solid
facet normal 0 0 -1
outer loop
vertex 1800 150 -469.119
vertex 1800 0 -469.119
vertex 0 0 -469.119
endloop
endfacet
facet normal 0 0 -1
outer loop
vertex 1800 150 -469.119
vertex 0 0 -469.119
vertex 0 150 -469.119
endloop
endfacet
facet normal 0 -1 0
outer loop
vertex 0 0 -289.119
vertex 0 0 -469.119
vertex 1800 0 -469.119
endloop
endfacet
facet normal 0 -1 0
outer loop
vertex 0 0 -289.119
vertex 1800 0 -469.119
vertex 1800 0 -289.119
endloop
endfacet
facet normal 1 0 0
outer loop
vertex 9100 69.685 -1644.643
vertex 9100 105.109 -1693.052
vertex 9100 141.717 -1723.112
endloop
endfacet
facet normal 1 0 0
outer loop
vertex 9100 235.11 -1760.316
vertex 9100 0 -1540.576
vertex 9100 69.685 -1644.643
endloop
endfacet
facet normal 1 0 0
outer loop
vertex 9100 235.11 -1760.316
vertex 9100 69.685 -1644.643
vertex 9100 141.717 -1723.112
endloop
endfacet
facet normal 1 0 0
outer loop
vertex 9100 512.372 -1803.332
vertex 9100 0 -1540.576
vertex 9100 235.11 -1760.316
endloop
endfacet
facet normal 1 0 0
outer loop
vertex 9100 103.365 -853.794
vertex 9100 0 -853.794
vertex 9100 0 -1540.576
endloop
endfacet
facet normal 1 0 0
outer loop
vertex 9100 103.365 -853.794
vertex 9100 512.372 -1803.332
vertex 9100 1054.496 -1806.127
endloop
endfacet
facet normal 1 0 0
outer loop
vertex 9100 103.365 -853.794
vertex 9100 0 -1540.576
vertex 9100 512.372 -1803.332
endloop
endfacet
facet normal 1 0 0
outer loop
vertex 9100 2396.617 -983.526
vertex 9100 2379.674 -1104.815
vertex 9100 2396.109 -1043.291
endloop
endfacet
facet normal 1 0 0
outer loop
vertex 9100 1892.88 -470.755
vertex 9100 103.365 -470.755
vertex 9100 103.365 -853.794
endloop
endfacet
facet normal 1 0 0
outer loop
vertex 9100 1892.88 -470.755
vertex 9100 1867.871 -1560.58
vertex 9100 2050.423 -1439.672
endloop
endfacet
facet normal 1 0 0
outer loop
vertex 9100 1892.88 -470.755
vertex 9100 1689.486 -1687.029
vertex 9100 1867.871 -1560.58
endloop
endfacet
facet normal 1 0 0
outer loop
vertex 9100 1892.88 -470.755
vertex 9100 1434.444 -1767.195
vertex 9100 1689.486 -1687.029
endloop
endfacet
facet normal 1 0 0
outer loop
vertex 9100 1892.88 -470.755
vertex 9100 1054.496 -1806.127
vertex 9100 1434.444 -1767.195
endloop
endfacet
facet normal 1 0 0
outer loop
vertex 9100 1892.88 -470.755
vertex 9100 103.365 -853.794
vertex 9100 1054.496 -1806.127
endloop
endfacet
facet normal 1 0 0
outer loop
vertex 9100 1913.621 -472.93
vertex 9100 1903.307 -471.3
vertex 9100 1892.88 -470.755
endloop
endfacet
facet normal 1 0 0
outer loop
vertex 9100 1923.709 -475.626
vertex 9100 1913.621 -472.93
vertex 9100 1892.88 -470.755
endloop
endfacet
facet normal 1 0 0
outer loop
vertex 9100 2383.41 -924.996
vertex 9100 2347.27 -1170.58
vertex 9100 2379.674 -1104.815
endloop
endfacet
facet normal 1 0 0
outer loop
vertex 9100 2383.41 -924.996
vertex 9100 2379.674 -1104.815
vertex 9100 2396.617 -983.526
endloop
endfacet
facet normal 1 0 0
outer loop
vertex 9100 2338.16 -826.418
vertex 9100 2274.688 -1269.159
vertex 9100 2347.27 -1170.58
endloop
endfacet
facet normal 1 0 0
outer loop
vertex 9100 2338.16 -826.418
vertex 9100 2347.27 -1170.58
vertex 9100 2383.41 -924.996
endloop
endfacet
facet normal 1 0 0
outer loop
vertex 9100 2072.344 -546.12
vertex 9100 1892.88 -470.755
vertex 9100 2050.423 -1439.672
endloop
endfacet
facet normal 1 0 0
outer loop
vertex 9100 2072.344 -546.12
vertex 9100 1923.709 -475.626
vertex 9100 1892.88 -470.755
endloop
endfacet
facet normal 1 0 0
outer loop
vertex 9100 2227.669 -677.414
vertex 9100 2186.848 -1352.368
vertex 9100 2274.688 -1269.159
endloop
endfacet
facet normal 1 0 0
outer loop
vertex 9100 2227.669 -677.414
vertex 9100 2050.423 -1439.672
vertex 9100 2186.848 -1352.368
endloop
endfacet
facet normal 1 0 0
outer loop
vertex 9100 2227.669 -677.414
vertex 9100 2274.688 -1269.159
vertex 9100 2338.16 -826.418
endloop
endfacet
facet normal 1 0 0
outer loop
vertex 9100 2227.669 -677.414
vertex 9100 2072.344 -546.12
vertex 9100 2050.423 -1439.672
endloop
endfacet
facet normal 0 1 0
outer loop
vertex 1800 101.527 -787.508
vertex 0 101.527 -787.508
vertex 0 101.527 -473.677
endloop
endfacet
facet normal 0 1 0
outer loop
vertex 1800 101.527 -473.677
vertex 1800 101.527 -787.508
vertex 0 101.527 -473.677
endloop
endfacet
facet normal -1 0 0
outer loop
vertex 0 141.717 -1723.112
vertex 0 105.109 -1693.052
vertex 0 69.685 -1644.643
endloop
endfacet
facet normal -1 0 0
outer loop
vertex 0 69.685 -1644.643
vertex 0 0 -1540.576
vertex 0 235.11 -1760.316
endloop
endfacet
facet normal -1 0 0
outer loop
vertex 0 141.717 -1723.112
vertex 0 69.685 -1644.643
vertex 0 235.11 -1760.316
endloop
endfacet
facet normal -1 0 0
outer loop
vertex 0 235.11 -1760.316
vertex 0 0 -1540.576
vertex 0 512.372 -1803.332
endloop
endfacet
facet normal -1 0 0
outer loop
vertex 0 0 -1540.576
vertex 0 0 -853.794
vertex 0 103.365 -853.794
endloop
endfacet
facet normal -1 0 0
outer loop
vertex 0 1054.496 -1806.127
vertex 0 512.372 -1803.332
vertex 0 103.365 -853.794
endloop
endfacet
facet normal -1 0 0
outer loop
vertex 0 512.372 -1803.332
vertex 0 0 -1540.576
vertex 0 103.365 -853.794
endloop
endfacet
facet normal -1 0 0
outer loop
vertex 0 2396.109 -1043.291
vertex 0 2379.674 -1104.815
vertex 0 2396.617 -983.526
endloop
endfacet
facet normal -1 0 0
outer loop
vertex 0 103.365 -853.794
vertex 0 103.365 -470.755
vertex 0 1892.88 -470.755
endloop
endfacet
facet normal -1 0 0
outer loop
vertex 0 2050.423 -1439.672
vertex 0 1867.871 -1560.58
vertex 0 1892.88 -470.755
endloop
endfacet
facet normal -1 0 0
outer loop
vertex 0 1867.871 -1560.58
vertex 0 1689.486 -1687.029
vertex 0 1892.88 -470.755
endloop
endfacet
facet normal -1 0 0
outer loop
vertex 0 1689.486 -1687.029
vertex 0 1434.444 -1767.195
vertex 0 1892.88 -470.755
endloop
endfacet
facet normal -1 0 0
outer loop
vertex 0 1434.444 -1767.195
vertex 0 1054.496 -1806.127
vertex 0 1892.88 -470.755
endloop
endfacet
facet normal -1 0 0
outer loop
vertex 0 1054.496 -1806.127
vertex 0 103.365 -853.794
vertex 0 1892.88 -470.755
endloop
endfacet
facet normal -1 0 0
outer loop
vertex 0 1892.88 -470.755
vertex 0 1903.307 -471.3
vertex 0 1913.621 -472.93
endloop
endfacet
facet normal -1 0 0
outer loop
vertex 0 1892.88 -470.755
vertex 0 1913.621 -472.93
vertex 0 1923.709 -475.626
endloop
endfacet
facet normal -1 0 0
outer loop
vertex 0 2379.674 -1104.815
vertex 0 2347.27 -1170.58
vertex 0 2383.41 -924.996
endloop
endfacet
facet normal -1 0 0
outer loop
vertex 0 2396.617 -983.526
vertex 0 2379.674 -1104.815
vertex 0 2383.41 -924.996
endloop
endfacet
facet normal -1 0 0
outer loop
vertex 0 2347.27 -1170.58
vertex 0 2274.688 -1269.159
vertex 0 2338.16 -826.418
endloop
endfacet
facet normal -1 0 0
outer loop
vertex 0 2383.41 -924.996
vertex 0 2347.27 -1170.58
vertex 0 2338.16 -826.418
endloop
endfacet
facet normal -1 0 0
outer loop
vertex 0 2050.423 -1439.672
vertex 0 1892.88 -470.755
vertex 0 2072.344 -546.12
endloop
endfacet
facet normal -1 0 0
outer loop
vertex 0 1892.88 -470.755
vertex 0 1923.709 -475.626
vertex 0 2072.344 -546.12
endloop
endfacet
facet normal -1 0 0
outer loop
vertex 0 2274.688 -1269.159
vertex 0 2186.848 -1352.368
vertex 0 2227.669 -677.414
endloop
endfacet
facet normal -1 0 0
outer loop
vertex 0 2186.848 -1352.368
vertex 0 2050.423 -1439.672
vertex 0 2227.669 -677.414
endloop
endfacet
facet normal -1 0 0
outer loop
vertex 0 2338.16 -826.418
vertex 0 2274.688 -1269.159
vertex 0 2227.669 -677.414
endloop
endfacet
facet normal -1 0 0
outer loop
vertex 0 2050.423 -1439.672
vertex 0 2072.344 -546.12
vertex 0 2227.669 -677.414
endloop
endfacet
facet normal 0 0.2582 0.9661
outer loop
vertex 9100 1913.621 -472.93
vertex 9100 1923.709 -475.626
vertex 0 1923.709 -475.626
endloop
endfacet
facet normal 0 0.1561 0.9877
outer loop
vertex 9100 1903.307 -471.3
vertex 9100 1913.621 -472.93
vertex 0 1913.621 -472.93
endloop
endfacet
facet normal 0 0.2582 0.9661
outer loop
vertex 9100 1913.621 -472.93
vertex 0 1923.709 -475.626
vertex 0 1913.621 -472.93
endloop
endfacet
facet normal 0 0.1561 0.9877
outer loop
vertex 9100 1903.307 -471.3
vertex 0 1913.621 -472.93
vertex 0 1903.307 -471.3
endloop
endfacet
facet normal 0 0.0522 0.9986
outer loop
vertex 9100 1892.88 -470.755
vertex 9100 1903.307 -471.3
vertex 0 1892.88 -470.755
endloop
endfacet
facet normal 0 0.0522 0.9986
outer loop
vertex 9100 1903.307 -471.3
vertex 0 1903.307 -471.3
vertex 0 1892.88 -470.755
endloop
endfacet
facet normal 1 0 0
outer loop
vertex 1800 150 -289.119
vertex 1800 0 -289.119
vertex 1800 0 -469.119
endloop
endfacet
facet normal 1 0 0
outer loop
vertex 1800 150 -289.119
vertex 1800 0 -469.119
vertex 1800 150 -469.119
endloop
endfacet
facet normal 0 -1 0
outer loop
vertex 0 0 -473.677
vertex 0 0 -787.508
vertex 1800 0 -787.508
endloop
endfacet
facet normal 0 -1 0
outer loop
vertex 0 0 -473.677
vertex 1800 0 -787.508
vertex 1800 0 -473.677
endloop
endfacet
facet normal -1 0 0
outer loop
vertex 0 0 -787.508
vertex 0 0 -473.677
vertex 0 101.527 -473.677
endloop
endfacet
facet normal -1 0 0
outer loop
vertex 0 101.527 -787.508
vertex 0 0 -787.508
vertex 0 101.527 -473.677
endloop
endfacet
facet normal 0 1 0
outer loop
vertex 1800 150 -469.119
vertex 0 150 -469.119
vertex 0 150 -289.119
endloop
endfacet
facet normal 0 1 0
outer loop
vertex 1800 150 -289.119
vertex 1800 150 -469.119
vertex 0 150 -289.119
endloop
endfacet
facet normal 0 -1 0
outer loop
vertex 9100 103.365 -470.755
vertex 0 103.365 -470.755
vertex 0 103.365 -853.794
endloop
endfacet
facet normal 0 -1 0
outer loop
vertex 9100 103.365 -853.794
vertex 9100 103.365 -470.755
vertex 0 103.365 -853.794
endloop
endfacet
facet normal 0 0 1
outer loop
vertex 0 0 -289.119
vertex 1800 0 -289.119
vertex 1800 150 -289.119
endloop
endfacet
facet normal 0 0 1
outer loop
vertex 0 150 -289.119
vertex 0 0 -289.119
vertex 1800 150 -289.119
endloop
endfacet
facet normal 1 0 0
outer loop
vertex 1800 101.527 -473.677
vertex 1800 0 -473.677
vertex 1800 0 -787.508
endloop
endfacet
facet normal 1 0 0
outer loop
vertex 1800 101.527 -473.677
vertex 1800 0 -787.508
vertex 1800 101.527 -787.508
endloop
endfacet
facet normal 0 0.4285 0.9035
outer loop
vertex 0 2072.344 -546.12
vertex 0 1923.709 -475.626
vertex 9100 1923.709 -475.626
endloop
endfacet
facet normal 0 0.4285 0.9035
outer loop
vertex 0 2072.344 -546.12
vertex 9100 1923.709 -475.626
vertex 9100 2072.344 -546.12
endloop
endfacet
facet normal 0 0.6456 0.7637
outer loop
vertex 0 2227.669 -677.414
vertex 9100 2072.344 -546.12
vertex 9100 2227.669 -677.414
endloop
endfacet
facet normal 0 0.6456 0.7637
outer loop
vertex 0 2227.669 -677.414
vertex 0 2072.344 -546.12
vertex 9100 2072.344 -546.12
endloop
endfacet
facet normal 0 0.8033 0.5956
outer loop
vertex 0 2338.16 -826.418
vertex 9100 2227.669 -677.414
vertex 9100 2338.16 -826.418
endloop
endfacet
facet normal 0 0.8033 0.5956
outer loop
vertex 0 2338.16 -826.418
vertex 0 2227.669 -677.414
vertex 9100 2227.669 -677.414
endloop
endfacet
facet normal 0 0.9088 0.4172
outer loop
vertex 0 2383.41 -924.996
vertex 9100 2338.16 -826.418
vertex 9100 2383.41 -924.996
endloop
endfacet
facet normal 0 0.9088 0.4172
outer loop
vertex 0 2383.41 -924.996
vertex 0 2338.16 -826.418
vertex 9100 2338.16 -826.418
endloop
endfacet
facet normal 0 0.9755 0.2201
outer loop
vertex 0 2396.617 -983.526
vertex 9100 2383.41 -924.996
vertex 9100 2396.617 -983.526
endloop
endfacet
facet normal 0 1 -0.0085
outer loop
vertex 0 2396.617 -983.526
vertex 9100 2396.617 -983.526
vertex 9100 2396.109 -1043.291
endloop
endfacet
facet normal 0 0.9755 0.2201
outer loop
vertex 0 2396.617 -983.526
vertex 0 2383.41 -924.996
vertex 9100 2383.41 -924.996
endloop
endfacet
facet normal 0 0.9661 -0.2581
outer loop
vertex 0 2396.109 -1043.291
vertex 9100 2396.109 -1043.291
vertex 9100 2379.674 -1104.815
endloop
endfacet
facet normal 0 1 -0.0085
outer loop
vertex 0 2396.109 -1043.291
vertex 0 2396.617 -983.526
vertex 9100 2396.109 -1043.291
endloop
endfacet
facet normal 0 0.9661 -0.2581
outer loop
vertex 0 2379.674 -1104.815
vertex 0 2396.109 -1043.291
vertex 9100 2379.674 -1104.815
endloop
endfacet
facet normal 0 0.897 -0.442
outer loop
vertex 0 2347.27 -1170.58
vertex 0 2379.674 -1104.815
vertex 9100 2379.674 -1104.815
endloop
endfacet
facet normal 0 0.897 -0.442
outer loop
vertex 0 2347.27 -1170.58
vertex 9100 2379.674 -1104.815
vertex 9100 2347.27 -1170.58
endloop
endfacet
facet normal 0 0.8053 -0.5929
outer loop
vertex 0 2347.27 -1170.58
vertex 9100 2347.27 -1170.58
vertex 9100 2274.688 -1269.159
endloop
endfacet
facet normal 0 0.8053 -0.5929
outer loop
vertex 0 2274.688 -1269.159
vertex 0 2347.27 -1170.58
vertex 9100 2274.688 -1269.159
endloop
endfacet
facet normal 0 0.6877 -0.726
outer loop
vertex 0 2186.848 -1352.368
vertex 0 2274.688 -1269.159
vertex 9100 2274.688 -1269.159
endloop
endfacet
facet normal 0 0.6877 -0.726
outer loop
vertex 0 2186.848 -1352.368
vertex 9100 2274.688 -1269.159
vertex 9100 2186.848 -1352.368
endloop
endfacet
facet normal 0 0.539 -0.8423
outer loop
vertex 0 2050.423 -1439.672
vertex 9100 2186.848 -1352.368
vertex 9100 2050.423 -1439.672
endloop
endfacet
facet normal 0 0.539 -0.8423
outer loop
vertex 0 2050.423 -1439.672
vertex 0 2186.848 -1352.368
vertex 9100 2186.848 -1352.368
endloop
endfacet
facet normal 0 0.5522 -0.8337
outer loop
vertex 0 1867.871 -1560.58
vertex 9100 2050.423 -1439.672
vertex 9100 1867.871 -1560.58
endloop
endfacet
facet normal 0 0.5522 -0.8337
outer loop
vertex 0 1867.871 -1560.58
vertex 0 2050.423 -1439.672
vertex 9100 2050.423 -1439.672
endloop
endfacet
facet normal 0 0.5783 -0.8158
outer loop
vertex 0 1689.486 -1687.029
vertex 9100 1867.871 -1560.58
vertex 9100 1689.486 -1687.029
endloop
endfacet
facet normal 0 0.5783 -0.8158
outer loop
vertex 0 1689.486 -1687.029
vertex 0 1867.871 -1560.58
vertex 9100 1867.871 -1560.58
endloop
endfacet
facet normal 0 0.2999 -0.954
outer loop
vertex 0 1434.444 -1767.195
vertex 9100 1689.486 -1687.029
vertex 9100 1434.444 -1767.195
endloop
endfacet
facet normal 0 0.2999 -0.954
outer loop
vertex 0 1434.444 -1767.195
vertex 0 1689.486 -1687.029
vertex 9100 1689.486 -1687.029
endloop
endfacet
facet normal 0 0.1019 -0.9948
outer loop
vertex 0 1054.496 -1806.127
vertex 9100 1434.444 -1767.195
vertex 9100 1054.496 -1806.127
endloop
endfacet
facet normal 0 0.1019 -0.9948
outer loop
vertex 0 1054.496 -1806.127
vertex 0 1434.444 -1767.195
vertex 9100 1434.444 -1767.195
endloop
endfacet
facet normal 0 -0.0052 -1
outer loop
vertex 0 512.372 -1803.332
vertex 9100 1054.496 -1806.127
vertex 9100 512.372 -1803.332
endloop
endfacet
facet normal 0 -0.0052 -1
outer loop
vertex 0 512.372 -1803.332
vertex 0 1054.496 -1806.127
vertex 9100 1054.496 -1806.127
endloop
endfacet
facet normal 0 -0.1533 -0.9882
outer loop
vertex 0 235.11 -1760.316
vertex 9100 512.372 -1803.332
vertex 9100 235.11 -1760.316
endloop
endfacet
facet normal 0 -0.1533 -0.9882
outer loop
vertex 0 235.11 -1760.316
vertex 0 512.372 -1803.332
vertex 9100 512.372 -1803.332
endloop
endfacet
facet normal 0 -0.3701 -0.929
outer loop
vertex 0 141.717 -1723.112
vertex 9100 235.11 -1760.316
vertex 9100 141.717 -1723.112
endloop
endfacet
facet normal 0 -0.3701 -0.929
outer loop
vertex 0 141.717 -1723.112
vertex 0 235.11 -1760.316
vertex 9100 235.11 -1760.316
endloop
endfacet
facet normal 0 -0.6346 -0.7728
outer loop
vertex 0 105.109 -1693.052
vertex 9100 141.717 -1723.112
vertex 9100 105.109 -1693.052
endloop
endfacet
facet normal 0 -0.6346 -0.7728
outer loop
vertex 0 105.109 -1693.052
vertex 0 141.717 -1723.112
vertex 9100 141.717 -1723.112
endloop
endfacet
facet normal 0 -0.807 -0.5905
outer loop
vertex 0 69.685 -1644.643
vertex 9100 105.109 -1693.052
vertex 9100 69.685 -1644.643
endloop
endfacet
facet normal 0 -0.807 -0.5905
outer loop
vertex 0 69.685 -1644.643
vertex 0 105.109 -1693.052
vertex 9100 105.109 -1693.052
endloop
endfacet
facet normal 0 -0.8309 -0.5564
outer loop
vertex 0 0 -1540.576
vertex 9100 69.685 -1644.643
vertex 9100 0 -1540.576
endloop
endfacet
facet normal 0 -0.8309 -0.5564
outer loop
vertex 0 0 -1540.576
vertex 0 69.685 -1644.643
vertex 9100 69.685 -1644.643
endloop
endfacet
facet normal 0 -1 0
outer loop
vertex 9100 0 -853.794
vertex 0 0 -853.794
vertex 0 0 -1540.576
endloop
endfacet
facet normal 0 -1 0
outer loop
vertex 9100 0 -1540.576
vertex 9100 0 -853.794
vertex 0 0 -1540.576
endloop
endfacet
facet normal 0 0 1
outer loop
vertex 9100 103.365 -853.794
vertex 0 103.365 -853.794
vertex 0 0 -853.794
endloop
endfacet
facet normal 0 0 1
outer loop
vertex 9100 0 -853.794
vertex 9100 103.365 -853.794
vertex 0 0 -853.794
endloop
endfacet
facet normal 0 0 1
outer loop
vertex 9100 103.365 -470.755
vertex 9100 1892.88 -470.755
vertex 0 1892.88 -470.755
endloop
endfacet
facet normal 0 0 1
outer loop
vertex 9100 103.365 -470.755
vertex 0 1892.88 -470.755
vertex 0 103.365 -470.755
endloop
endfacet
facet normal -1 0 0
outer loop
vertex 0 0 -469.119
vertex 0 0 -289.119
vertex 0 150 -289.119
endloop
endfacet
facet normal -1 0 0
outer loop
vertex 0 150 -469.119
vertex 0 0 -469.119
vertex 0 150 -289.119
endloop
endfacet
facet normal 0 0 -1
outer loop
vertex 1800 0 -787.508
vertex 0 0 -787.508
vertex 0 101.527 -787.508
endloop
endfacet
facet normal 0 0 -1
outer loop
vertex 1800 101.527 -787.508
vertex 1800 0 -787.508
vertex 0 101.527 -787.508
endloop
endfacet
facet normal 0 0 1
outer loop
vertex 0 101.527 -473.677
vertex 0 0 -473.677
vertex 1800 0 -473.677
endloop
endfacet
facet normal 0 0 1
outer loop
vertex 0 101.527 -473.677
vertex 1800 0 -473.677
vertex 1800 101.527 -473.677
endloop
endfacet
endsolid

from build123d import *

# Parameters (mm, degrees)
F0_W     = 150
F0_H     = 180
F2_DEPTH = 1800
F1_W     = 101.5273034573
F1_H     = 313.8310611248
F3_DEPTH = 1800
F5_DEPTH = 9100


with BuildPart() as f2:
    # F0 (on Right) → F2 (new body)
    with BuildSketch(Plane.YZ):
        with Locations((75, -379.1194679699)):
            Rectangle(F0_W, F0_H)
    extrude(amount=F2_DEPTH)


with BuildPart() as f3:
    # F1 (on Right) → F3 (new body)
    with BuildSketch(Plane.YZ):
        with Locations((50.7636517286, -630.5923610926)):
            Rectangle(F1_W, F1_H)
    extrude(amount=F3_DEPTH)


with BuildPart() as f5:
    # F4 (on Right) → F5 (new body)
    with BuildSketch(Plane.YZ):
        with BuildLine():
            Line((1892.8797360895, -470.7551300526), (103.3653095365, -470.7551300526))
            Line((103.3653095365, -470.7551300526), (103.3653095365, -853.7938594818))
            Line((103.3653095365, -853.7938594818), (0, -853.7938594818))
            Line((0, -853.7938594818), (0, -1540.5761003494))
            add(Edge.make_bspline(
                [(1923.7091770953, -475.6260305758), (2021.9512276147, -507.4643168356), (2114.6007561157, -574.5791921256), (2249.4279442365, -688.1869419876), (2373.689926805, -869.3452291568), (2422.473149728, -1054.9374831824), (2294.9004643375, -1264.5787956653), (2129.584685818, -1405.8258208718), (1905.6214540672, -1507.908233405), (1729.6425266662, -1710.9073670417), (1220.5242073932, -1821.0436072173), (783.690356481, -1798.497289961), (533.4726392689, -1811.6214951257), (290.8362151937, -1780.3357721623), (124.6406409215, -1728.1579217684), (71.3329574678, -1646.7422520232), (24.26819364, -1576.7017946172), (0, -1540.5761003494)],
                knots=[0.0033219062, 0.0033219062, 0.0033219062, 0.0033219062, 0.0680592667, 0.1252175941, 0.1901994824, 0.2493596167, 0.3159739851, 0.3815235111, 0.4491424894, 0.5199617022, 0.6195594363, 0.7128235923, 0.7823840817, 0.8513461576, 0.9078907149, 0.9500859275, 1, 1, 1, 1], degree=3))
            ThreePointArc((1923.7091770953, -475.6260305758), (1908.4856652883, -471.9803611394), (1892.8797360895, -470.7551300526))
        make_face()
    extrude(amount=F5_DEPTH)


solid = Compound([f2.part, f3.part, f5.part])
